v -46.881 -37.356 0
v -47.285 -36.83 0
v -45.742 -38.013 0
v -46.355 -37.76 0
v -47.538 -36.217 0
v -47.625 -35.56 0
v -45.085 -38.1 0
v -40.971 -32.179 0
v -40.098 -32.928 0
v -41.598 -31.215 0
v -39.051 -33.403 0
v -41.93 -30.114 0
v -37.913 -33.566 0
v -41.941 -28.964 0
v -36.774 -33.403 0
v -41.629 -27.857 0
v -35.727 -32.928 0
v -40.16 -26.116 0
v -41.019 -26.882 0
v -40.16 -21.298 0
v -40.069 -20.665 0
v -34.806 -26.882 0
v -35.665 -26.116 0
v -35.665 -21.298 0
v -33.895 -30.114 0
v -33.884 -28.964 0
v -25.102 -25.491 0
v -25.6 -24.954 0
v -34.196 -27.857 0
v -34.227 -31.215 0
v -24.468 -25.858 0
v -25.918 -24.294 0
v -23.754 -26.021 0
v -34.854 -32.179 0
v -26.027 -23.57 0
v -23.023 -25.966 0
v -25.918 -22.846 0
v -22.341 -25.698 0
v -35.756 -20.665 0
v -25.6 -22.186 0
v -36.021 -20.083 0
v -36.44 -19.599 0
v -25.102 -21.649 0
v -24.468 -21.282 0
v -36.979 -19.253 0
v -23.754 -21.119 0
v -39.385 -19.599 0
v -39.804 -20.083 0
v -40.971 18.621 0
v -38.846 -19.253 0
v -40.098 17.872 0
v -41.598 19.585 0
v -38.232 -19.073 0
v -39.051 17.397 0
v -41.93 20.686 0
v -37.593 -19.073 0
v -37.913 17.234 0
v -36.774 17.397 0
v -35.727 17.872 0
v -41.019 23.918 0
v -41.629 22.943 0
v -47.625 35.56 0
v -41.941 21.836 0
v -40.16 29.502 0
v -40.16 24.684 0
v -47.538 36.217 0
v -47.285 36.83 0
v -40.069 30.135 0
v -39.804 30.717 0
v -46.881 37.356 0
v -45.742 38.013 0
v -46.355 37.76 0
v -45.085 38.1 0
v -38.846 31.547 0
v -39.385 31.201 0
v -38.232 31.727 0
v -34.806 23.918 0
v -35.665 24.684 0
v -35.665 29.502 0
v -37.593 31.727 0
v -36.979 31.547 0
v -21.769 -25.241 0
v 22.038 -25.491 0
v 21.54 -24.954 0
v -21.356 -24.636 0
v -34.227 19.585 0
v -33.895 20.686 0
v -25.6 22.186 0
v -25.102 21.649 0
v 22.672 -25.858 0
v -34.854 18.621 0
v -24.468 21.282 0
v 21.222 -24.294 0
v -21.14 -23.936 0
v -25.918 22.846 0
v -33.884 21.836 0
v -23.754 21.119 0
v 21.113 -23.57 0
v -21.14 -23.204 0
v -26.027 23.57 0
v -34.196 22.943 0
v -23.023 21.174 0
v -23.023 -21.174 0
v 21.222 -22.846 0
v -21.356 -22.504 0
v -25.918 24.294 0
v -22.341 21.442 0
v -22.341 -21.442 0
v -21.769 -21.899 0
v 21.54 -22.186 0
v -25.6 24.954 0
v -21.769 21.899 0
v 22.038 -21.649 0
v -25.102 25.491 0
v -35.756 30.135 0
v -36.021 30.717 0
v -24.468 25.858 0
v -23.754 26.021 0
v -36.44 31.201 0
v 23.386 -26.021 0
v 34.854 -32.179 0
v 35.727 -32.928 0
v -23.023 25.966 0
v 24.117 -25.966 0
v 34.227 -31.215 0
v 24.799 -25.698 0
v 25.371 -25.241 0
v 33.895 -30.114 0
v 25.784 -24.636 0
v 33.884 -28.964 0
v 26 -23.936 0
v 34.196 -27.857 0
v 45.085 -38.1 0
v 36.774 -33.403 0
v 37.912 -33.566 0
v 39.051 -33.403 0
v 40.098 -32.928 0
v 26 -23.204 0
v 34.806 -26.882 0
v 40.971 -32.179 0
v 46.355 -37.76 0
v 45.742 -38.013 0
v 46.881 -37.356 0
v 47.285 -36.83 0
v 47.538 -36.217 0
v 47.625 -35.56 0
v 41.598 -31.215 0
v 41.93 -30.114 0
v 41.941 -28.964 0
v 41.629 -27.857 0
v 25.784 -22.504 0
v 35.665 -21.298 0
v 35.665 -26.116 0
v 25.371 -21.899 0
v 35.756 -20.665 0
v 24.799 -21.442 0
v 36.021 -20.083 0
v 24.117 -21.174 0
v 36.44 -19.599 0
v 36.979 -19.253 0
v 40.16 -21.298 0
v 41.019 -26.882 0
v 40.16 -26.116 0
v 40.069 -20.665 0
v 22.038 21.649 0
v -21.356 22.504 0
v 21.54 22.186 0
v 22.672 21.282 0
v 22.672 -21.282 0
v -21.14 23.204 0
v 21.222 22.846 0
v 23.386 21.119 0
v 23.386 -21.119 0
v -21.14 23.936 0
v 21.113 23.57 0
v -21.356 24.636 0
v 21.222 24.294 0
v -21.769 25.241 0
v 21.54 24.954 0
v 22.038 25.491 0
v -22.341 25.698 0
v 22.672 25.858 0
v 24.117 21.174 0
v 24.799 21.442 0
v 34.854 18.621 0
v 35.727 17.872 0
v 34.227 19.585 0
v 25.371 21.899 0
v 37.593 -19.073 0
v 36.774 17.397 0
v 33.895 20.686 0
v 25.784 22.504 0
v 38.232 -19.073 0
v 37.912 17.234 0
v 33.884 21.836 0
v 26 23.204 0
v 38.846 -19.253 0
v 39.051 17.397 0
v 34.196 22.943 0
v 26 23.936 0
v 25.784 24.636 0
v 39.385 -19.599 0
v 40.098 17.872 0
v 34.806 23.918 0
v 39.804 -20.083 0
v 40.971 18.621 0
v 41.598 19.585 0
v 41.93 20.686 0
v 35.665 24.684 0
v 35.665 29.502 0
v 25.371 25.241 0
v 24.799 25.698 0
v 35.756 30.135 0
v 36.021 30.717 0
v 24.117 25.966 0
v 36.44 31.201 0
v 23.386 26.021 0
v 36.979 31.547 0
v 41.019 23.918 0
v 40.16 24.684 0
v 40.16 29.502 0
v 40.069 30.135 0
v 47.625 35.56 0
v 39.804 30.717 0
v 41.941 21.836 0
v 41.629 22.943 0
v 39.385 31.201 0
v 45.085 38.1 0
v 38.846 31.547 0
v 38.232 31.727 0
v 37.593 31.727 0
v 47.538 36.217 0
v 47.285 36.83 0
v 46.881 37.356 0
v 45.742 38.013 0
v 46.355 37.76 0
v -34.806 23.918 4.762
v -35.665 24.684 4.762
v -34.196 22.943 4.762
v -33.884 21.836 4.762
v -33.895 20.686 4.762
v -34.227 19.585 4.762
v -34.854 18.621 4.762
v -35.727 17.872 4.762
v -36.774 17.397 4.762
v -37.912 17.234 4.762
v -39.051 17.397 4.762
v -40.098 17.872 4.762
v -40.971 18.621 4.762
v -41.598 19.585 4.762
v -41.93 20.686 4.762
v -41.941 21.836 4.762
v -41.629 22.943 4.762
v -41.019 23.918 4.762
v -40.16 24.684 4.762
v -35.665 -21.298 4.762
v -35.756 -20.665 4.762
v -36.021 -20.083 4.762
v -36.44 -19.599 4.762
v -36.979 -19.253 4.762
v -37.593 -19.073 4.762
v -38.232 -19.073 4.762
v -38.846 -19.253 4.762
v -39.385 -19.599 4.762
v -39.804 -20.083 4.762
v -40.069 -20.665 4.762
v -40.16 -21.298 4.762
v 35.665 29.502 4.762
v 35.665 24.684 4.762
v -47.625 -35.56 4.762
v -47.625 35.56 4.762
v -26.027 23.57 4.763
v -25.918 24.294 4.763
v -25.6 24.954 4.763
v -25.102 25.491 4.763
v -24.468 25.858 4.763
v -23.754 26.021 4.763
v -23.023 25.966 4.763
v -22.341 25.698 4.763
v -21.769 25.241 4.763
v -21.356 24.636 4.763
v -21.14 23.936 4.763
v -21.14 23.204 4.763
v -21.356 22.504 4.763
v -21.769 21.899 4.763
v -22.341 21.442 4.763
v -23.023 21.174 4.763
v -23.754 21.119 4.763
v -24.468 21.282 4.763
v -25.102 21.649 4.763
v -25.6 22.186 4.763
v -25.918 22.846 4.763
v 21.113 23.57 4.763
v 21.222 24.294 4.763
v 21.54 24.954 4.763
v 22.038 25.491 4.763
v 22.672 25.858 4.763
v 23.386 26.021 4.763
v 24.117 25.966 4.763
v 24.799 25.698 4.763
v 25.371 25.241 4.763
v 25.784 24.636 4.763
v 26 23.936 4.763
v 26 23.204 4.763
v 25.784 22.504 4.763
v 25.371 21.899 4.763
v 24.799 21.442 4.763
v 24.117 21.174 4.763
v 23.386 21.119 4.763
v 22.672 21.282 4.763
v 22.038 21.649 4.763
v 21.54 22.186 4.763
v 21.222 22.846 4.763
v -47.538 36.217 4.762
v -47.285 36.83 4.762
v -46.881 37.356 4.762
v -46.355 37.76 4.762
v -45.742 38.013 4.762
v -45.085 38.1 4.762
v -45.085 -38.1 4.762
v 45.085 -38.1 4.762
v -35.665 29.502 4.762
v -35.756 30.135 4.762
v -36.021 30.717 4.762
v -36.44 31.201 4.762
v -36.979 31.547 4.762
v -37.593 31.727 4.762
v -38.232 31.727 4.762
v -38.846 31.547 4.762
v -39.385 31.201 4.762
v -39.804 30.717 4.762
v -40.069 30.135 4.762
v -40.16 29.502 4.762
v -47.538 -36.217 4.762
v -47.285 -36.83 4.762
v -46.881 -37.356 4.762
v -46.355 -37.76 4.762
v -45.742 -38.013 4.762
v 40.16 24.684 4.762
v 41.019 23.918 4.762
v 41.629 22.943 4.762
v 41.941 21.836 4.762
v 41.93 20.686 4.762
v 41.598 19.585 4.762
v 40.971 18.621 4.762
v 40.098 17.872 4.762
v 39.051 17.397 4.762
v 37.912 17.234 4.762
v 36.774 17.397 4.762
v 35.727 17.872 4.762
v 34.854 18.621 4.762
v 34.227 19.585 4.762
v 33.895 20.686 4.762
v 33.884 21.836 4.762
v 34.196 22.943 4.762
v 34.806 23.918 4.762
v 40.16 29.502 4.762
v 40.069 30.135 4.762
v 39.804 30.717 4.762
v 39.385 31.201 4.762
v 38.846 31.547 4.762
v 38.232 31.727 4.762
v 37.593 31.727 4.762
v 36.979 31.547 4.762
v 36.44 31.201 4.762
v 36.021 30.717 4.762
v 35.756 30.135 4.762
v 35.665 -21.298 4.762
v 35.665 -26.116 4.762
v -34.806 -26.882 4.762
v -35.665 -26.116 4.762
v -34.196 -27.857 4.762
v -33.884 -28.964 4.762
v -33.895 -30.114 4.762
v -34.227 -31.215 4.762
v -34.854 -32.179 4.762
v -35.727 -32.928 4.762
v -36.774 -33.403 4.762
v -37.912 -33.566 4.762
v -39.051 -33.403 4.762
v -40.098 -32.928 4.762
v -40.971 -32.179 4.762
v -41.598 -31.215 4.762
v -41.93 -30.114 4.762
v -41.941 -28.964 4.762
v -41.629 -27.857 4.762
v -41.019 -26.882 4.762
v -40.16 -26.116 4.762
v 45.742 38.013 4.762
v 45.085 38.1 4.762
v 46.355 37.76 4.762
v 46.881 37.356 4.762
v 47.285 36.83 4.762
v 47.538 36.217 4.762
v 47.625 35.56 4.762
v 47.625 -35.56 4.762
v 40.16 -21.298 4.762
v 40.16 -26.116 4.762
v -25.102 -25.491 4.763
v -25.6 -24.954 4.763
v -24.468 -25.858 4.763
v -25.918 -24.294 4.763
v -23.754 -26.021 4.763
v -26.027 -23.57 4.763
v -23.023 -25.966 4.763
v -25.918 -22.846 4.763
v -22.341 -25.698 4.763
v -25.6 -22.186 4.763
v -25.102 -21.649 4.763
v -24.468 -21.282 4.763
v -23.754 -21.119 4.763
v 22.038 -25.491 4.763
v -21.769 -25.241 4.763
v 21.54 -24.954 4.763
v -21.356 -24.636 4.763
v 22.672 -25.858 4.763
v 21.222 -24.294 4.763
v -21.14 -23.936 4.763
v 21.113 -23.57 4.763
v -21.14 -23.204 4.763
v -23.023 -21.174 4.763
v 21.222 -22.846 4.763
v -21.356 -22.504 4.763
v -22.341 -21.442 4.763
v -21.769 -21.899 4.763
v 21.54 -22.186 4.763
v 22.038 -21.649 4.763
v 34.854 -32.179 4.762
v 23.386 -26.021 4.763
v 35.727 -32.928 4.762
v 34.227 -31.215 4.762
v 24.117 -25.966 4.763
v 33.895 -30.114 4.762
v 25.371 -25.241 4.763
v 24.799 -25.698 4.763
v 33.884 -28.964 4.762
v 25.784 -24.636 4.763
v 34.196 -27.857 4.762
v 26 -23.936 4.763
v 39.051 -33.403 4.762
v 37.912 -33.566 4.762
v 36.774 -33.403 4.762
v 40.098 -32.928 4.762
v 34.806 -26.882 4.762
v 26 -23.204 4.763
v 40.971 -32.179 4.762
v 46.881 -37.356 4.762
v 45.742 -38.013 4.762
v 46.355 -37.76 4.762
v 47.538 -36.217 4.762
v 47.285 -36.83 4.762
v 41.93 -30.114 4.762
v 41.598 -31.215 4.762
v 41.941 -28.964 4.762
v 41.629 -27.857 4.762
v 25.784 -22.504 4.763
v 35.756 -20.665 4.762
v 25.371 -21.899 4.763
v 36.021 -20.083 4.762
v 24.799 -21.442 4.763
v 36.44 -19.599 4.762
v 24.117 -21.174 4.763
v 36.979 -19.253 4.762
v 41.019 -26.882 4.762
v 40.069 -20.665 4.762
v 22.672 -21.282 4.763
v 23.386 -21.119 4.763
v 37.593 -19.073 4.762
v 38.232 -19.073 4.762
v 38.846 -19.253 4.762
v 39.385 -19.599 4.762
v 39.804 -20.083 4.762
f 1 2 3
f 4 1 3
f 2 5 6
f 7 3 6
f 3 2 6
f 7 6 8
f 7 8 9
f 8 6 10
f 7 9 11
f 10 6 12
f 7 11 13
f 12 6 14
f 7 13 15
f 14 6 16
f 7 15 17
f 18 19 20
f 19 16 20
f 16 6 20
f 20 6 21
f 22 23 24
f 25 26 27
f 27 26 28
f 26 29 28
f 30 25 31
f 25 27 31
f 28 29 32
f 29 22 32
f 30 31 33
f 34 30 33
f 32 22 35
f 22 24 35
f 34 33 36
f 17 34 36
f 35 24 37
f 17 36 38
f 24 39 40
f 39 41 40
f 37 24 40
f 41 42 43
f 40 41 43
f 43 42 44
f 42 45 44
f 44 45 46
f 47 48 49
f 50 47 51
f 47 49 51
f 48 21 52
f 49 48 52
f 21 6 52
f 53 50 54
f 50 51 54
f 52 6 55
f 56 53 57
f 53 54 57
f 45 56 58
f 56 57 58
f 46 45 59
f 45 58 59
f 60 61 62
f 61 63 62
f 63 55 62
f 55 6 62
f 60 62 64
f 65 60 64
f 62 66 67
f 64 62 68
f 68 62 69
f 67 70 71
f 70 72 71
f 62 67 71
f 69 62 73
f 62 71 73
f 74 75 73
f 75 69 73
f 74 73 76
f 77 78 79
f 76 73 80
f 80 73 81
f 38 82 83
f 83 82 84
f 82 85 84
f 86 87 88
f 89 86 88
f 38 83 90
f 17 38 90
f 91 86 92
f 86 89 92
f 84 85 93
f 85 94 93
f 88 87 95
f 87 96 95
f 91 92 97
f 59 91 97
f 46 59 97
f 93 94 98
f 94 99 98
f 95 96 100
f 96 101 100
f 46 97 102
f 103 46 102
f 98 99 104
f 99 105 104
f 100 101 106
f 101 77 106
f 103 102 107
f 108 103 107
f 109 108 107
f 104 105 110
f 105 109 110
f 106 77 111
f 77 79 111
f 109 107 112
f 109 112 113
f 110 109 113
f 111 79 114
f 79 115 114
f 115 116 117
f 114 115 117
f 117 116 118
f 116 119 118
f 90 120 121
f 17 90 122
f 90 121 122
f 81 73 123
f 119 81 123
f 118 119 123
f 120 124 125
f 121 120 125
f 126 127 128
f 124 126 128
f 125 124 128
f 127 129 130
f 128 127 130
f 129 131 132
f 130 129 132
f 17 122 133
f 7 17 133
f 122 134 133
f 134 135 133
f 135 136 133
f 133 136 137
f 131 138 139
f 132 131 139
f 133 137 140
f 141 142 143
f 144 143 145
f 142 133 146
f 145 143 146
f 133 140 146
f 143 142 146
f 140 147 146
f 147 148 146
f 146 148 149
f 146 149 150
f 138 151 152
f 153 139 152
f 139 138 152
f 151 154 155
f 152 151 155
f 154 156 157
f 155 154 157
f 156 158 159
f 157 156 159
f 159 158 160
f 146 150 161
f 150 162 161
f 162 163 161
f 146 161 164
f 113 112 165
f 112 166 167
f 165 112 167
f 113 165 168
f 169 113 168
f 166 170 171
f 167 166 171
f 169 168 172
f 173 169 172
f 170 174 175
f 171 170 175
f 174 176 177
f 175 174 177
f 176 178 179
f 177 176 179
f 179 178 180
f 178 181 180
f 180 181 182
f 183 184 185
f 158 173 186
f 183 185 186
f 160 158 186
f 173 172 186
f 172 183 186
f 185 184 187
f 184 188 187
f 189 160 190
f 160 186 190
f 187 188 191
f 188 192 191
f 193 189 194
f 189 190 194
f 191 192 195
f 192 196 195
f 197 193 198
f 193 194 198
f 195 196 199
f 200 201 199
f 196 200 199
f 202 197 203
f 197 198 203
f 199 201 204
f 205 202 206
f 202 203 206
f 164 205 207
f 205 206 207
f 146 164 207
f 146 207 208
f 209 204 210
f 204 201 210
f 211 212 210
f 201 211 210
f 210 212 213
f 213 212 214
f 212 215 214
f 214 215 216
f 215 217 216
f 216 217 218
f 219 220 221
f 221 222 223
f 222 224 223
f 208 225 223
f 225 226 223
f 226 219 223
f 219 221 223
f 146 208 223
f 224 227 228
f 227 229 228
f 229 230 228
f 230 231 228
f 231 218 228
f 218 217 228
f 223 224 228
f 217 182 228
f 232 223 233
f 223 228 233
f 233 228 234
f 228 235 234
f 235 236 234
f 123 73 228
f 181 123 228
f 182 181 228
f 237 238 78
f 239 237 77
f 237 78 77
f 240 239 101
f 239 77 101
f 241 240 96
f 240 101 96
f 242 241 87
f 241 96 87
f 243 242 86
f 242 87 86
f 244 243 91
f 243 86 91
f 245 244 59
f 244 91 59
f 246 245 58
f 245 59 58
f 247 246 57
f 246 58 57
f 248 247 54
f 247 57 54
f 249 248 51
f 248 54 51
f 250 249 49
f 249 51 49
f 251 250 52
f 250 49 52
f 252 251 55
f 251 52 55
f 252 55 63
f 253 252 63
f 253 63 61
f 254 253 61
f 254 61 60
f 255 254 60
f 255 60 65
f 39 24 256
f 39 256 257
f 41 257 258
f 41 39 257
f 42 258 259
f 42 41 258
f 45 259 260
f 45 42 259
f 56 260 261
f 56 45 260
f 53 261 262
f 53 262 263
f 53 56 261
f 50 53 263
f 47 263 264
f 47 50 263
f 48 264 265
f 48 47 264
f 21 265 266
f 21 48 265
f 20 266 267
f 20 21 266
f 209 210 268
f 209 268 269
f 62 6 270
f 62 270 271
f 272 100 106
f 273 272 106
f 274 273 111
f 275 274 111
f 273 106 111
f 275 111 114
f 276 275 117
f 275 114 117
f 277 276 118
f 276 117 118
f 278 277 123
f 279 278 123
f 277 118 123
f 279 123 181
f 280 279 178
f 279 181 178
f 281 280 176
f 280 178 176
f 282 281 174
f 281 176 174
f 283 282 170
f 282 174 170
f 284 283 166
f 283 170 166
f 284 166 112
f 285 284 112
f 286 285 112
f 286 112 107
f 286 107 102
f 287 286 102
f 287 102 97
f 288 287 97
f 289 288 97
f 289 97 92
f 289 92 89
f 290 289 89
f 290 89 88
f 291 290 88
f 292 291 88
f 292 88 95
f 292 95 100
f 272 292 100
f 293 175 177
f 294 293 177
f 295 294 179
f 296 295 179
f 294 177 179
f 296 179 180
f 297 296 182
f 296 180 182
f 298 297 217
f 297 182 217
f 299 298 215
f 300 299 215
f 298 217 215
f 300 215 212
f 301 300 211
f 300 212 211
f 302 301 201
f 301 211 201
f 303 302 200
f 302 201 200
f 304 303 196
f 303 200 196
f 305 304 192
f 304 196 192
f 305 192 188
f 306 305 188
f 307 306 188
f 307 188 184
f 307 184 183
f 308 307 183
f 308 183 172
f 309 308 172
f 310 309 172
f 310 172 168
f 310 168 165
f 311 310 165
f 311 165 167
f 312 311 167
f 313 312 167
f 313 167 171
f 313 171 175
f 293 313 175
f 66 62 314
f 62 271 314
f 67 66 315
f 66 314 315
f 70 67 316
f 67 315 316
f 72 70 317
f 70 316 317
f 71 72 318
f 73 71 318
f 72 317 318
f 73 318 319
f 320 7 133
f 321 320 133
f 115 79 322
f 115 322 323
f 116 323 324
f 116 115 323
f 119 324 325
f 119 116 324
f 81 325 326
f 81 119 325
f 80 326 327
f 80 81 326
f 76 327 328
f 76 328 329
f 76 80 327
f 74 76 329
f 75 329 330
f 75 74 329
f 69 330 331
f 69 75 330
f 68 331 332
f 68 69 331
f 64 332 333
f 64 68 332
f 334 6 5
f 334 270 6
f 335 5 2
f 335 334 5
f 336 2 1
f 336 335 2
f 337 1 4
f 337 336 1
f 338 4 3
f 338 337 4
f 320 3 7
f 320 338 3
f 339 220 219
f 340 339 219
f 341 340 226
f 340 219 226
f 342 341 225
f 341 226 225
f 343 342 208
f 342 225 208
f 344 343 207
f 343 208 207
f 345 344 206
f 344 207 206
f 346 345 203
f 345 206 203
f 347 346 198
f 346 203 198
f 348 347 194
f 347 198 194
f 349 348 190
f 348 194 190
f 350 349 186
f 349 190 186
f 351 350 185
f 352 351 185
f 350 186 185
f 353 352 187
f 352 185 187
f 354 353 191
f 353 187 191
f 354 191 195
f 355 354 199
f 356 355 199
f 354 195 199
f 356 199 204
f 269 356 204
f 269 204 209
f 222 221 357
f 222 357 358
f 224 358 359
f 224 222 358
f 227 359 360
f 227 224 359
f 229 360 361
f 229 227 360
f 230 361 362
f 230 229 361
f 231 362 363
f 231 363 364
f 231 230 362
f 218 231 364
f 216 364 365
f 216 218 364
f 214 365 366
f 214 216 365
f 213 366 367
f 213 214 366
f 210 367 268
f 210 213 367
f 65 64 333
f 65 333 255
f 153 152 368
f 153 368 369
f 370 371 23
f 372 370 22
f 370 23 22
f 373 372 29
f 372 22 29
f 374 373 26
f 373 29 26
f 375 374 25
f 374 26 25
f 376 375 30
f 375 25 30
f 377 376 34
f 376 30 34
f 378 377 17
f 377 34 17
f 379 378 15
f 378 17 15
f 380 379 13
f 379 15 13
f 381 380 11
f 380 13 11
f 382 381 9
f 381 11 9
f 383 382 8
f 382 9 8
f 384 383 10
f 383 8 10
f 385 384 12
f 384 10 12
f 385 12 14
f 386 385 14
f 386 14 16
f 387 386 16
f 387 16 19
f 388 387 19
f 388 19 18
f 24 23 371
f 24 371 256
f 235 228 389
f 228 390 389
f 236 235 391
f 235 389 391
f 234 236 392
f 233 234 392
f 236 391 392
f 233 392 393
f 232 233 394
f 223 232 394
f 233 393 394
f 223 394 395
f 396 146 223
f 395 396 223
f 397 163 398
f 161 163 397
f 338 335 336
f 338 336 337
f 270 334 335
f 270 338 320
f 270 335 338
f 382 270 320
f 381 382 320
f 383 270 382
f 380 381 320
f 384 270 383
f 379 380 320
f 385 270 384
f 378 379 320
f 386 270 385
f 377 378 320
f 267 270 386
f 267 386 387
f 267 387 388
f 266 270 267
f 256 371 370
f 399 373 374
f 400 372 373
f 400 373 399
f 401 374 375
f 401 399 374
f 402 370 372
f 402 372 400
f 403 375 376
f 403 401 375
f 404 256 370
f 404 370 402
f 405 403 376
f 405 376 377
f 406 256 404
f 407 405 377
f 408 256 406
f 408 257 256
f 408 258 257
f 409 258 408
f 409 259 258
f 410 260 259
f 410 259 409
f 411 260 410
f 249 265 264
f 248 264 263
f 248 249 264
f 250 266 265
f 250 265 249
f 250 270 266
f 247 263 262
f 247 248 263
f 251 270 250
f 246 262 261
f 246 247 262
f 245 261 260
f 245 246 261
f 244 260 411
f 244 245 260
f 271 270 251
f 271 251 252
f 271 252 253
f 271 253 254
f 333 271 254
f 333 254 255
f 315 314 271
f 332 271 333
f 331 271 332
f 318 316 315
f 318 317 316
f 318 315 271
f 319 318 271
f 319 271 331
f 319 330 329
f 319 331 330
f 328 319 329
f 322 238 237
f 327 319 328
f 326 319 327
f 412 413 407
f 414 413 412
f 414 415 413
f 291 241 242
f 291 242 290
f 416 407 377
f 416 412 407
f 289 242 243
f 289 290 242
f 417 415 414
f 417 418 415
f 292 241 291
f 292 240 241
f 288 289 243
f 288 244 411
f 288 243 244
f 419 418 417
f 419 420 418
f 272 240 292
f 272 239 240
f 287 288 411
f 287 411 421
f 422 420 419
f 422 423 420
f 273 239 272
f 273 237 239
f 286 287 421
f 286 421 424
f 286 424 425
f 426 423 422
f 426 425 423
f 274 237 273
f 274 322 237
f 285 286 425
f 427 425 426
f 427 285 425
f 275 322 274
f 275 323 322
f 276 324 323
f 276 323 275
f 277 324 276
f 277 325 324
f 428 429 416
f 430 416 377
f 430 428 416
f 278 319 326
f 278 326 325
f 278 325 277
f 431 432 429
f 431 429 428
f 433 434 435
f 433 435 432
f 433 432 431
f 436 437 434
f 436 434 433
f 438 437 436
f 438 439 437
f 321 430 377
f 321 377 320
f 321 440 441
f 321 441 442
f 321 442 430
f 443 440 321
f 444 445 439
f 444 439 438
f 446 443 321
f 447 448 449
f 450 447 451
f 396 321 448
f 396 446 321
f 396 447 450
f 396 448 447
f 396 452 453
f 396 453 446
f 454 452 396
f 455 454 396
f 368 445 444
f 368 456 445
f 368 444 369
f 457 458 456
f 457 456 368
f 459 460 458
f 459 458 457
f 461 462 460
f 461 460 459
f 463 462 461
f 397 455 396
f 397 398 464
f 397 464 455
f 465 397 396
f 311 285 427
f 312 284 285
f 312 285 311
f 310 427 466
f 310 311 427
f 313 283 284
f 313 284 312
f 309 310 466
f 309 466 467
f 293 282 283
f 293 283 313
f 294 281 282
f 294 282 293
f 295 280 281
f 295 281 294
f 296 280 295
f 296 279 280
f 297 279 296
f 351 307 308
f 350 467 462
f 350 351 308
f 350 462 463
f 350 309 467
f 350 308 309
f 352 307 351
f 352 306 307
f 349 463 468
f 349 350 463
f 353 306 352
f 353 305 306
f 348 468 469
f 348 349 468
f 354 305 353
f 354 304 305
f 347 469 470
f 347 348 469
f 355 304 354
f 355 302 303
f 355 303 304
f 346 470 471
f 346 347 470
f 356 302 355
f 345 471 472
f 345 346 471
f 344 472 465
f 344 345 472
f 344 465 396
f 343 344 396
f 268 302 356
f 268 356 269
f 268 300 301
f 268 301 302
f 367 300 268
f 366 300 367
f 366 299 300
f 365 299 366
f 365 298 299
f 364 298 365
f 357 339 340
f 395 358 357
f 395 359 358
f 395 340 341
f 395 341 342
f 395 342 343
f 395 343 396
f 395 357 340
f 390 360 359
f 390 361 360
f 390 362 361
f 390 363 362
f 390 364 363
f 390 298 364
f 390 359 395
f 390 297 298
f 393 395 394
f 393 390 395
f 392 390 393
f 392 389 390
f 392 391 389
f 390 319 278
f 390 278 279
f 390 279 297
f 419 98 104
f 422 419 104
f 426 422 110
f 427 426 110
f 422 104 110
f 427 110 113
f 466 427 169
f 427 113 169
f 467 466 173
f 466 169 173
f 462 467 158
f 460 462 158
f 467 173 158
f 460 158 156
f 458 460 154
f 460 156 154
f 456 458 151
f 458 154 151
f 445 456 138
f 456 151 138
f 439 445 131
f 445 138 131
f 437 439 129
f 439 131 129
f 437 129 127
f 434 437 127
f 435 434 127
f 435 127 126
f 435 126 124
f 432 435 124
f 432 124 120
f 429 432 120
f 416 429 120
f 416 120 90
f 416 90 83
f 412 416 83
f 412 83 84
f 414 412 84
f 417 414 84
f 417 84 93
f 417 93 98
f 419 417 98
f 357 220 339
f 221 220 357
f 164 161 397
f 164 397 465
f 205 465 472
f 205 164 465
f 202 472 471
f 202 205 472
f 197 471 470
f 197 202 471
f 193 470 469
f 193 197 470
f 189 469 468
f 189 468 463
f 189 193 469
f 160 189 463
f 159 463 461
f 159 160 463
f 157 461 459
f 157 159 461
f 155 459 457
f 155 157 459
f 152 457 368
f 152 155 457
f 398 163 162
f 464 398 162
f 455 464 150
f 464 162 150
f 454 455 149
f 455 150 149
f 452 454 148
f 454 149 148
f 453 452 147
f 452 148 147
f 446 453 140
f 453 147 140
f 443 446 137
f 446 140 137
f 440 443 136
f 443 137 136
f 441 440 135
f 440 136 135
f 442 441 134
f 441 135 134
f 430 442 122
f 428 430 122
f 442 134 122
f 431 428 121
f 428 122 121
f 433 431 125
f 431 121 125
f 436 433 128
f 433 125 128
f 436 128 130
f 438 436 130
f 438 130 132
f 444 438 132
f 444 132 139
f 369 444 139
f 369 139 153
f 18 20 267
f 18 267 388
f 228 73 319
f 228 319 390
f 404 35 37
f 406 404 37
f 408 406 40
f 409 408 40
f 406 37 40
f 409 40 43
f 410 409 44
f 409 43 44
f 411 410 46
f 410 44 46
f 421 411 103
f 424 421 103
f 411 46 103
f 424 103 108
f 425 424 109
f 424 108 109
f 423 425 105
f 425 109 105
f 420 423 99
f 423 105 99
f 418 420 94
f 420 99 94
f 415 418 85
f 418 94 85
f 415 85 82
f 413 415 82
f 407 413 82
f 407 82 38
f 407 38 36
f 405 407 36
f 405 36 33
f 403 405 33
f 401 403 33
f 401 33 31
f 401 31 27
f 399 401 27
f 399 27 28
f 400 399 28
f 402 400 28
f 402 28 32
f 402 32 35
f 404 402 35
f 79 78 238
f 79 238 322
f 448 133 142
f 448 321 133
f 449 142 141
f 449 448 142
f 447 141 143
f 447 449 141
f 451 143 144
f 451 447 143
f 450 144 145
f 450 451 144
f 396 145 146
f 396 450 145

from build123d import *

# Parameters (mm, degrees)
SKETCH1_W                 = 95.25
SKETCH1_H                 = 76.2
BOSS_EXTRUDE1_DEPTH       = 4.7625
F_8_CLEARANCE_HOLE1_D     = 4.9149
FILLET1_R                 = 2.54
F_8_CLEARANCE_SLOT1_DEPTH = 4.7625
SKETCH6_R                 = 4.064
CUT_EXTRUDE1_DEPTH        = 62.175420156


# Read off the part's stored shape, not the designer's step: #8 Clearance Slot1
with BuildPart() as part:
    # Sketch1 → Boss-Extrude1 (new body)
    with BuildSketch(Plane.XY):
        Rectangle(SKETCH1_W, SKETCH1_H)
    extrude(amount=BOSS_EXTRUDE1_DEPTH)

    # #8 Clearance Hole1 (through all)
    with Locations(Plane.XY.offset(4.7625)):
        with Locations((23.57, 23.57), (-23.57, 23.57), (-23.57, -23.57), (23.57, -23.57)):
            Hole(F_8_CLEARANCE_HOLE1_D / 2)

    # Fillet1
    fillet1_edges = [part.edges().sort_by_distance(p)[0] for p in [
        (-47.625, 38.1, 2.38125),
        (47.625, 38.1, 2.38125),
        (47.625, -38.1, 2.38125),
        (-47.625, -38.1, 2.38125),
    ]]
    fillet(fillet1_edges, radius=FILLET1_R)

    # #8 Clearance Slot1 outline → #8 Clearance Slot1 (cut)
    with BuildSketch(Plane.XY):
        with BuildLine():
            ThreePointArc((-40.1604, 21.2979), (-37.9125, 19.05), (-35.6646, 21.2979))
            Line((-35.6646, 21.2979), (-35.6646, 29.5021))
            ThreePointArc((-35.6646, 29.5021), (-37.9125, 31.75), (-40.1604, 29.5021))
            Line((-40.1604, 29.5021), (-40.1604, 21.2979))
        make_face()
        with BuildLine():
            ThreePointArc((-35.6646, -21.2979), (-37.9125, -19.05), (-40.1604, -21.2979))
            Line((-40.1604, -21.2979), (-40.1604, -29.5021))
            ThreePointArc((-40.1604, -29.5021), (-37.9125, -31.75), (-35.6646, -29.5021))
            Line((-35.6646, -29.5021), (-35.6646, -21.2979))
        make_face()
        with BuildLine():
            ThreePointArc((35.6646, -29.5021), (37.9125, -31.75), (40.1604, -29.5021))
            Line((40.1604, -29.5021), (40.1604, -21.2979))
            ThreePointArc((40.1604, -21.2979), (37.9125, -19.05), (35.6646, -21.2979))
            Line((35.6646, -21.2979), (35.6646, -29.5021))
        make_face()
        with BuildLine():
            ThreePointArc((40.1604, 29.5021), (37.9125, 31.75), (35.6646, 29.5021))
            Line((35.6646, 29.5021), (35.6646, 21.2979))
            ThreePointArc((35.6646, 21.2979), (37.9125, 19.05), (40.1604, 21.2979))
            Line((40.1604, 21.2979), (40.1604, 29.5021))
        make_face()
    extrude(amount=F_8_CLEARANCE_SLOT1_DEPTH, mode=Mode.SUBTRACT)

    # Sketch6 → Cut-Extrude1 (cut, through all)
    with BuildSketch(Plane(origin=(0, 0, 0), x_dir=(-1, 0, 0), z_dir=(0, 0, -1))):
        with Locations((-37.9125, 21.2979)):
            Circle(SKETCH6_R)
        with Locations((-37.9125, -29.5021)):
            Circle(SKETCH6_R)
        with Locations((37.9125, -29.5021)):
            Circle(SKETCH6_R)
        with Locations((37.9125, 21.2979)):
            Circle(SKETCH6_R)
    extrude(amount=-CUT_EXTRUDE1_DEPTH, mode=Mode.SUBTRACT)


solid = part.part
